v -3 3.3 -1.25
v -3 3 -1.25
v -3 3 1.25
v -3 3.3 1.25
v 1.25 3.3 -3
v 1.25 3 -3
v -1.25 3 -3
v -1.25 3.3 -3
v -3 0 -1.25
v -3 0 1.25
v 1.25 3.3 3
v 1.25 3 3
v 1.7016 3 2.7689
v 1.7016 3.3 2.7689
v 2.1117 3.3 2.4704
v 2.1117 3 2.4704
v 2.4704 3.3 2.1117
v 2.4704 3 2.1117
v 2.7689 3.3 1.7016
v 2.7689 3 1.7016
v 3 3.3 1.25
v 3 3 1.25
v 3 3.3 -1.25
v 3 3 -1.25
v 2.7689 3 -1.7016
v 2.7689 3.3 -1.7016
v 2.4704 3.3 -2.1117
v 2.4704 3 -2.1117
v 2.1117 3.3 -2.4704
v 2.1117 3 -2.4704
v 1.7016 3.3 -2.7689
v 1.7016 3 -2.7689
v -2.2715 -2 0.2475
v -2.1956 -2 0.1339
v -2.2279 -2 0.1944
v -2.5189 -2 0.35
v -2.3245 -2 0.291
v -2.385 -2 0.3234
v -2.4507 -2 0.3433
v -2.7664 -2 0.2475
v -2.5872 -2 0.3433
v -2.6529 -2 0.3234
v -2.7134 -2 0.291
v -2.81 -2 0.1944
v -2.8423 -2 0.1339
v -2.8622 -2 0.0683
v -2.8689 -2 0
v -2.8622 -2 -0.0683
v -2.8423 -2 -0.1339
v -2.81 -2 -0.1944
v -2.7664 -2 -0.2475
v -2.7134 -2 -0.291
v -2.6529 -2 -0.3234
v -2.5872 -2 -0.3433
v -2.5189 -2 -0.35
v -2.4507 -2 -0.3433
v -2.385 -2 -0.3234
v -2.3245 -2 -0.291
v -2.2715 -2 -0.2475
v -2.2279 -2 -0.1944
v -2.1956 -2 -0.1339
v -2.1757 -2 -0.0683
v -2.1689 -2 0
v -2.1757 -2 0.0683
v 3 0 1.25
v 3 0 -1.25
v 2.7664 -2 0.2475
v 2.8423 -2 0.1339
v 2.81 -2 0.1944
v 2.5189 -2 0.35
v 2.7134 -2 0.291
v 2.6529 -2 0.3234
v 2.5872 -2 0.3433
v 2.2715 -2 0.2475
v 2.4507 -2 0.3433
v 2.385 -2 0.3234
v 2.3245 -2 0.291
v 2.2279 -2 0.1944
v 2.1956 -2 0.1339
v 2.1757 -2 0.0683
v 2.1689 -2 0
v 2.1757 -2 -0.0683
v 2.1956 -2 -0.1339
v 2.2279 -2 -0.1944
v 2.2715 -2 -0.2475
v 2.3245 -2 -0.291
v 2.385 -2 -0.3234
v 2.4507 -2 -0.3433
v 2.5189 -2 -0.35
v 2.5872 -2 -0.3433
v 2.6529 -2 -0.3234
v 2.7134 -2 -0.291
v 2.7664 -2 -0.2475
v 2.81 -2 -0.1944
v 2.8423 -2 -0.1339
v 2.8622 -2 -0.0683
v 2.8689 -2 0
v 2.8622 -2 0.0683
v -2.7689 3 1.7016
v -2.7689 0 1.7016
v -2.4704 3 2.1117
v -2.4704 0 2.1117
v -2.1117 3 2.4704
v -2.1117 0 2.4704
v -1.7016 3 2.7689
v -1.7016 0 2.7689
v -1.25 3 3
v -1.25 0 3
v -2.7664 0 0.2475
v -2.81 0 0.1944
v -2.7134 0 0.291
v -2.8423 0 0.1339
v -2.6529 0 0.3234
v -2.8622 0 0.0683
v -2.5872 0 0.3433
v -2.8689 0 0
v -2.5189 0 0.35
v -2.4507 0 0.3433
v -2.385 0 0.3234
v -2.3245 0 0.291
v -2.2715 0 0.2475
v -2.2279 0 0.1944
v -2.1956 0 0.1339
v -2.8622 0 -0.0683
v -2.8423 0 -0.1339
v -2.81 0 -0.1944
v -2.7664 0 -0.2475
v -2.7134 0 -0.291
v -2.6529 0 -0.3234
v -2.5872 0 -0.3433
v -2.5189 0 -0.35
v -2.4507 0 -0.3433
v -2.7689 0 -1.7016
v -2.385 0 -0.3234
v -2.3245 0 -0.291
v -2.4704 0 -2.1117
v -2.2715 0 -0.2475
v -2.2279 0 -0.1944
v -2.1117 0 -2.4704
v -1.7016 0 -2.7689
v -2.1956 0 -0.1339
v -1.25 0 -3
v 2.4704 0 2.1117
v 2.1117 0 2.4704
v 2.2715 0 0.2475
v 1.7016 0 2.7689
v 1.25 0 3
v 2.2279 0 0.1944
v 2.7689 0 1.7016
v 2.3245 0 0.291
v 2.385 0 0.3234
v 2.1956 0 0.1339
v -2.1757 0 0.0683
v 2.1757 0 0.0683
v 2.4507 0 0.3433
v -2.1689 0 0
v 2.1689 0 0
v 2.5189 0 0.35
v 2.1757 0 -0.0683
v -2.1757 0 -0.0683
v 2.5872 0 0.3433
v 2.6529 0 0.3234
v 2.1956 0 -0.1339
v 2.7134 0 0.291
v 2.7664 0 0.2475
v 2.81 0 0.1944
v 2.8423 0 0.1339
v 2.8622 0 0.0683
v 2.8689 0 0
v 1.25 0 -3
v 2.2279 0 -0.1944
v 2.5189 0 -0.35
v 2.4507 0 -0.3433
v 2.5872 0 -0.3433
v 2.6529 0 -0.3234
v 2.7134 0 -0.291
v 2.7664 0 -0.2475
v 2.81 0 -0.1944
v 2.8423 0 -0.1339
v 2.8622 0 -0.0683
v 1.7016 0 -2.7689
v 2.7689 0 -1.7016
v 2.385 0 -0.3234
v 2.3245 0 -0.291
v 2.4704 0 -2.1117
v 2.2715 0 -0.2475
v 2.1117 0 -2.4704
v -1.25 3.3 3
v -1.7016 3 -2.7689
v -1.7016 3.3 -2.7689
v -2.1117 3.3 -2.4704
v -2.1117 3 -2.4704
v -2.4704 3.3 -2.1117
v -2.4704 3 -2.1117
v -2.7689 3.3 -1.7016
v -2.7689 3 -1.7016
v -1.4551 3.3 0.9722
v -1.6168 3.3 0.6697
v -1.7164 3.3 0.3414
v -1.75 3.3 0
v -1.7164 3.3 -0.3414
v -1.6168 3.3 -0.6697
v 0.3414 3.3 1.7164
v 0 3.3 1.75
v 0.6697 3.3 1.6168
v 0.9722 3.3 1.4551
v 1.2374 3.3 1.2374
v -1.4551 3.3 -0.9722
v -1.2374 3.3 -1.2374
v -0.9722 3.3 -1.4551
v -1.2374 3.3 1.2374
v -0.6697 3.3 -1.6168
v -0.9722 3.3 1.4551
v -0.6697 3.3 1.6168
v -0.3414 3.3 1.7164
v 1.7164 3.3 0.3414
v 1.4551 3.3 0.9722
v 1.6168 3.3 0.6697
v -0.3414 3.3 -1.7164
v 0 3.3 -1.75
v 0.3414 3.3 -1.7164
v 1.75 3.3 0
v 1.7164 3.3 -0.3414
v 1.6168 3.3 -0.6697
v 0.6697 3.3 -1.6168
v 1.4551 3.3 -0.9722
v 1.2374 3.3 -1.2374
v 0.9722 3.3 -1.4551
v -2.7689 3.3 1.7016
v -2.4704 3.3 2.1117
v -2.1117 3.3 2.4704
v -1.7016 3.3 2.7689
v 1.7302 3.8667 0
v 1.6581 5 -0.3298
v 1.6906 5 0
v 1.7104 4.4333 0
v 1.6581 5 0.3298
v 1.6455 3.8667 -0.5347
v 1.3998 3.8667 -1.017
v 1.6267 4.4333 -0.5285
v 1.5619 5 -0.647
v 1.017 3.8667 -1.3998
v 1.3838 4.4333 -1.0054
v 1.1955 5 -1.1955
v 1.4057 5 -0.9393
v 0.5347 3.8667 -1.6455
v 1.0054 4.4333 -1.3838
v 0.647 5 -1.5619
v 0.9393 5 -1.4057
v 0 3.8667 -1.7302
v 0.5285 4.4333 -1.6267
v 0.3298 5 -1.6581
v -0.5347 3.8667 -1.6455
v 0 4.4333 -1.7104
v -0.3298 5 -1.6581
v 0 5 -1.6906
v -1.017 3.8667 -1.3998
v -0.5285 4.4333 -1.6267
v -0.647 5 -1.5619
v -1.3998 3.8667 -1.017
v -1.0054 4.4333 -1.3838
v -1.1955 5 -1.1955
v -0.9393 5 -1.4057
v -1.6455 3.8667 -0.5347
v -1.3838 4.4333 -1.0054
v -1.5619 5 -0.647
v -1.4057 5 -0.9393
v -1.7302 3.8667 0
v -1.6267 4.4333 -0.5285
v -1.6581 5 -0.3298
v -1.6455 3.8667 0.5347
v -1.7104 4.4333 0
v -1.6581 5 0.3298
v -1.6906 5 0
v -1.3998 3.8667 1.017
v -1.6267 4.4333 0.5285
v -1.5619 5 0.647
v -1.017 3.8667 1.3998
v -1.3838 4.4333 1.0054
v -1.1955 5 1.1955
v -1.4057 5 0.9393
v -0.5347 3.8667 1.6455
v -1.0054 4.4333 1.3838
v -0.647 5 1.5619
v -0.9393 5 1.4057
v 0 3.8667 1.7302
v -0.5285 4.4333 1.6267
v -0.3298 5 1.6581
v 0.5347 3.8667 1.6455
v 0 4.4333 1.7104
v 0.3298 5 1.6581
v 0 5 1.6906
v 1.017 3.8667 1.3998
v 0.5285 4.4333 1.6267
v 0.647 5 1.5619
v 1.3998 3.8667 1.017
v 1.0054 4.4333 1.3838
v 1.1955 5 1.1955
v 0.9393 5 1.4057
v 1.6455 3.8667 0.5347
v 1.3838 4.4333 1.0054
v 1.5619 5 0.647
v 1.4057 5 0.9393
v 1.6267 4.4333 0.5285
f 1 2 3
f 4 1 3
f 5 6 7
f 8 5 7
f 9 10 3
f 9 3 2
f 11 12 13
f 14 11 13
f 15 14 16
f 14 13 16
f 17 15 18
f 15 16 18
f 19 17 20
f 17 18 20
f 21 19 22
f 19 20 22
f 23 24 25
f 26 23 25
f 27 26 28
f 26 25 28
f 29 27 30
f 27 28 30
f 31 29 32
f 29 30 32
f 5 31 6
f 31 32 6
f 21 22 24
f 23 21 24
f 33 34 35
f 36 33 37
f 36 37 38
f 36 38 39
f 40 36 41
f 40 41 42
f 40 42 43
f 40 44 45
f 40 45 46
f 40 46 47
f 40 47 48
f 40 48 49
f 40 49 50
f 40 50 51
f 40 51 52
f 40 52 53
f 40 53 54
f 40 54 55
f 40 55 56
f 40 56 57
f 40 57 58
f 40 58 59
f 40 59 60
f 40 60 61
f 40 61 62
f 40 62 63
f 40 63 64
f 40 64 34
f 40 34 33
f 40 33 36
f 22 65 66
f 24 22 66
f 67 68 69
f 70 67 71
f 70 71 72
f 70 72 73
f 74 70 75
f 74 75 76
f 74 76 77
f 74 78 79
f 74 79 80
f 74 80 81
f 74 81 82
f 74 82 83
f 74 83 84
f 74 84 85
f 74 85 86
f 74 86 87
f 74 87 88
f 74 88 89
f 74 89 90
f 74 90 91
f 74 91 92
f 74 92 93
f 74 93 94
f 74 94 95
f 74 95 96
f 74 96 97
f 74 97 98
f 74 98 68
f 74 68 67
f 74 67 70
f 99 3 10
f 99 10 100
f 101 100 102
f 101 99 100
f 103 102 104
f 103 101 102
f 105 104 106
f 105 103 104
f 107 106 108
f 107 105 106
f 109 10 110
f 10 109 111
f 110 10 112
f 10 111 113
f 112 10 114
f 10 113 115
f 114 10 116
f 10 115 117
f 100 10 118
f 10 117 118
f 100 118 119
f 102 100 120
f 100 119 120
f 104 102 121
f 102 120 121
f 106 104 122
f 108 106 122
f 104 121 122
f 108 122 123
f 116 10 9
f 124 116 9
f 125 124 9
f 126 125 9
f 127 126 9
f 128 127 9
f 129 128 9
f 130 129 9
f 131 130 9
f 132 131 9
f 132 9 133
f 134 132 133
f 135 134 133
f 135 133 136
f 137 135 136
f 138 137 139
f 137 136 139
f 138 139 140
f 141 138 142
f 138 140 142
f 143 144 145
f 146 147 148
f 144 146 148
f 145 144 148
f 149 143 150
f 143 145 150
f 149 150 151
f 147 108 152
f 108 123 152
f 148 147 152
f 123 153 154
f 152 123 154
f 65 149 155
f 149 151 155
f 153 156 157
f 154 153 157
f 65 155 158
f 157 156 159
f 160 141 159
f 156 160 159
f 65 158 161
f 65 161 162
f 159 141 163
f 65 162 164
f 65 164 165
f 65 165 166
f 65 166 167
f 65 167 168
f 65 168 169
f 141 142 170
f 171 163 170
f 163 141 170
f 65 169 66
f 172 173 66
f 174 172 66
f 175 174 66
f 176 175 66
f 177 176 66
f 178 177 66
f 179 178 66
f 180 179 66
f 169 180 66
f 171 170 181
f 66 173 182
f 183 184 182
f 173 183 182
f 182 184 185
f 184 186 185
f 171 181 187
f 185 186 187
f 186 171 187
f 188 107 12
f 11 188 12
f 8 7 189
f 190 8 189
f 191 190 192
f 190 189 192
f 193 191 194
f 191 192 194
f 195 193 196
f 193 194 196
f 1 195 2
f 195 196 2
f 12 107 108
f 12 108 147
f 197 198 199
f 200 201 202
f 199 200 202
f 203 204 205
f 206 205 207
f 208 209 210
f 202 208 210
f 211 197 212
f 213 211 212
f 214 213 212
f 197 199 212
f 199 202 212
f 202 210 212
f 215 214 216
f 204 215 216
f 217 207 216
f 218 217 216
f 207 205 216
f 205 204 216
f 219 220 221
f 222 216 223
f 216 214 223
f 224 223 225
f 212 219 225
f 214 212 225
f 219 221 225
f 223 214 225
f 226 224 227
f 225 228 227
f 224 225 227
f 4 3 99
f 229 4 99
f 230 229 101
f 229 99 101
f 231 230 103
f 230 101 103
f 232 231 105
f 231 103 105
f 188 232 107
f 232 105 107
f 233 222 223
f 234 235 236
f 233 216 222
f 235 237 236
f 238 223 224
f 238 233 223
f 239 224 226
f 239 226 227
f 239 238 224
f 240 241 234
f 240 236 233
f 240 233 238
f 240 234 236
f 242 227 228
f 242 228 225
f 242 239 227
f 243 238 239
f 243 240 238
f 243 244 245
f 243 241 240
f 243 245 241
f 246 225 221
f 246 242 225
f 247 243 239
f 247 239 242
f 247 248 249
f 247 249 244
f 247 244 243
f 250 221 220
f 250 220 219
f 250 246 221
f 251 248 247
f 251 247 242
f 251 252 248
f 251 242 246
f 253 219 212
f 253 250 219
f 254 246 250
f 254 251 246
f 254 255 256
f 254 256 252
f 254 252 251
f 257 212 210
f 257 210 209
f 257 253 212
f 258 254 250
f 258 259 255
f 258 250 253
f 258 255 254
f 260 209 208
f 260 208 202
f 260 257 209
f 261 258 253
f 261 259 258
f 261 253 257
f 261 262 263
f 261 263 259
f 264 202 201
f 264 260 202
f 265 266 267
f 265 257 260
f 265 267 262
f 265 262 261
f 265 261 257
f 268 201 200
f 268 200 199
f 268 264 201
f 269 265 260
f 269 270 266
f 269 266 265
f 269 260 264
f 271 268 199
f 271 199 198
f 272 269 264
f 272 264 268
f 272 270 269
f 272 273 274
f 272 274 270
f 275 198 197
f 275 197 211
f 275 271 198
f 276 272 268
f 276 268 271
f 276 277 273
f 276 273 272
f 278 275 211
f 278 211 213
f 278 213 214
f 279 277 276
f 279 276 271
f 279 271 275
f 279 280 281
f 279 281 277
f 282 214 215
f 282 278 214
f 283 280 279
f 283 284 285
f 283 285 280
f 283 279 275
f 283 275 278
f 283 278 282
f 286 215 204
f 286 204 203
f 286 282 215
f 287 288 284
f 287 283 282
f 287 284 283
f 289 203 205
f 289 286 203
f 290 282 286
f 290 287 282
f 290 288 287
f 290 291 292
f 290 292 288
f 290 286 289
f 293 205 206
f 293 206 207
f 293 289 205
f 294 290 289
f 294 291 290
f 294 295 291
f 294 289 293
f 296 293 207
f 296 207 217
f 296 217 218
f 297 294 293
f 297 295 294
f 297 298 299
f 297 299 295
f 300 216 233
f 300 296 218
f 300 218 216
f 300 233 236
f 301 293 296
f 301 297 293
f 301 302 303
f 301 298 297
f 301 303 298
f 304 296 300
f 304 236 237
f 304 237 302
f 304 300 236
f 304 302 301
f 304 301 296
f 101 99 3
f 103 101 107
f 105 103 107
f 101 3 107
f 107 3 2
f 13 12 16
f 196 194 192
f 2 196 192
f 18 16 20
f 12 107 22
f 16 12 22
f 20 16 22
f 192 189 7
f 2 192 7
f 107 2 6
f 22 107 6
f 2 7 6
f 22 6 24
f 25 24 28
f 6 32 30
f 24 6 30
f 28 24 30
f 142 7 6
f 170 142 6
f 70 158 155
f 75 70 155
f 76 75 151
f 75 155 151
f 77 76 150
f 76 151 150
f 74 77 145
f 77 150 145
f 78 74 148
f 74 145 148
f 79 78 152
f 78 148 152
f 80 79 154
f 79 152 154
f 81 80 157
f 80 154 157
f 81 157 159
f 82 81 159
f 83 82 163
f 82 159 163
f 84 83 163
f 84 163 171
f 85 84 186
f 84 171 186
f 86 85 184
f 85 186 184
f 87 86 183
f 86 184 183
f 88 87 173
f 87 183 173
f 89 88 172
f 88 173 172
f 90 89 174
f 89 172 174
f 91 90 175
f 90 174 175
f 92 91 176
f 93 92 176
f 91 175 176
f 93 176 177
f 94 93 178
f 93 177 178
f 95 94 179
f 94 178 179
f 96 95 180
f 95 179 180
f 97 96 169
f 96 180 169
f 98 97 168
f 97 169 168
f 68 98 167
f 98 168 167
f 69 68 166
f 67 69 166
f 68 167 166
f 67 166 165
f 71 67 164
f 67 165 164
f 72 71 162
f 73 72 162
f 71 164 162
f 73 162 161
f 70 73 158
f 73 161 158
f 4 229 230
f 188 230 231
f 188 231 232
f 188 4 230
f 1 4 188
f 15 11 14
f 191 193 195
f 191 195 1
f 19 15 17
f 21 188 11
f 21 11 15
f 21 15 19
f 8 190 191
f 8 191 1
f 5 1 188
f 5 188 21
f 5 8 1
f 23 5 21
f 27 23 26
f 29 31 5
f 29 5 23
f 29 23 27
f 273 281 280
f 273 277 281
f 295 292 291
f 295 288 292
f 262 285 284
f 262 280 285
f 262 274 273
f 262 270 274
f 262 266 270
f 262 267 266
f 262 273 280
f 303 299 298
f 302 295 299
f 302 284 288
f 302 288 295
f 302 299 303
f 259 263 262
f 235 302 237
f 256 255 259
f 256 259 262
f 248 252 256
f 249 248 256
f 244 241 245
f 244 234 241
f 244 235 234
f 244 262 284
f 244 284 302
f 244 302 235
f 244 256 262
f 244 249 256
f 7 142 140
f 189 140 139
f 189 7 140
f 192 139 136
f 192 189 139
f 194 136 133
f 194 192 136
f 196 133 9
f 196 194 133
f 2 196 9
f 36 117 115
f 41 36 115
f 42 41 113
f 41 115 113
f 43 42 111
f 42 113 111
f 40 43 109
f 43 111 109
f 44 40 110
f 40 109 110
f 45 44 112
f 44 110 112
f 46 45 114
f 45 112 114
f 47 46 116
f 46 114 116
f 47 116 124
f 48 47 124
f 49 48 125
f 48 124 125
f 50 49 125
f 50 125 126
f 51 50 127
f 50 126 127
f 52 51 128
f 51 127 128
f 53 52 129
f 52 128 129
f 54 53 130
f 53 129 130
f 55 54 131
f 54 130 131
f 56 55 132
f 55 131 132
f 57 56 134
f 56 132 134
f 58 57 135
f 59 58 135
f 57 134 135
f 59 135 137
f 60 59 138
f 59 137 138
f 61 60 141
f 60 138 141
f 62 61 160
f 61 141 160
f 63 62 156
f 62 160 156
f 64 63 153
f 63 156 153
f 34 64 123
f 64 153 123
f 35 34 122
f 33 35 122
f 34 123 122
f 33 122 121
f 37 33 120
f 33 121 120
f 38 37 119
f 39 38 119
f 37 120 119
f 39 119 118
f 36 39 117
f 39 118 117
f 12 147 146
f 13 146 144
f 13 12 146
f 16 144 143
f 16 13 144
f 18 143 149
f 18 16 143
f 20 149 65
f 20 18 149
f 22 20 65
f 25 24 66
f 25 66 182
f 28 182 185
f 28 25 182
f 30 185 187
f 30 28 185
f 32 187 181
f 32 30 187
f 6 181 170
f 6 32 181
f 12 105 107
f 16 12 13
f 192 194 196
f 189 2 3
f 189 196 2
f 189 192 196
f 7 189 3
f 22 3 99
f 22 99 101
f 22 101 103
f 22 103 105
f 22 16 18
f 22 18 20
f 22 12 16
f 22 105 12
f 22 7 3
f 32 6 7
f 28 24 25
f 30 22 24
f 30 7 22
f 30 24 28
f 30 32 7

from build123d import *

# Parameters (mm, degrees)
SCHIZZO1_W                   = 6
SCHIZZO1_H                   = 6
ESTRUSIONE_ESTRUSIONE1_DEPTH = 3
SCHIZZO2_OUTSIDE_W           = 9.8
SCHIZZO2_OUTSIDE_H           = 9.8
SCHIZZO2_OUTSIDE_R           = 3.25
TAGLIO_ESTRUSIONE1_DEPTH     = 6.196152423
SCHIZZO3_R                   = 0.35
ESTRUSIONE_ESTRUSIONE2_DEPTH = 2
ESTRUSIONE_ESTRUSIONE3_DEPTH = 0.3
SCHIZZO5_R                   = 1.75
ESTRUSIONE_ESTRUSIONE4_DEPTH = 1.7
ESTRUSIONE_ESTRUSIONE4_TAPER = 2


with BuildPart() as part:
    # Schizzo1 → Estrusione-Estrusione1 (new body)
    with BuildSketch(Plane(origin=(0, 0, 0), x_dir=(1, 0, 0), z_dir=(0, 1, 0))):
        Rectangle(SCHIZZO1_W, SCHIZZO1_H)
    extrude(amount=ESTRUSIONE_ESTRUSIONE1_DEPTH)

    # Schizzo2 outside → Taglio-Estrusione1 (cut, through all)
    with BuildSketch(Plane(origin=(0, 3, 0), x_dir=(1, 0, 0), z_dir=(0, 1, 0))):
        Rectangle(SCHIZZO2_OUTSIDE_W, SCHIZZO2_OUTSIDE_H)
        Circle(SCHIZZO2_OUTSIDE_R, mode=Mode.SUBTRACT)
    extrude(amount=-TAGLIO_ESTRUSIONE1_DEPTH, mode=Mode.SUBTRACT)

    # Schizzo3 → Estrusione-Estrusione2 (add)
    with BuildSketch(Plane.XZ):
        with Locations(Location((-2.518939755, 0, 0), (0, 0, 90))):
            Circle(SCHIZZO3_R)
        with Locations(Location((2.518939755, 0, 0), (0, 0, 90))):
            Circle(SCHIZZO3_R)
    extrude(amount=ESTRUSIONE_ESTRUSIONE2_DEPTH)


with BuildPart() as body_2:
    # Schizzo4 → Estrusione-Estrusione3 (new body)
    with BuildSketch(Plane(origin=(0, 3, 0), x_dir=(1, 0, 0), z_dir=(0, 1, 0))):
        with BuildLine():
            Line((-1.25, -3), (1.25, -3))
            ThreePointArc((1.25, -3), (2.298097039, -2.298097039), (3, -1.25))
            Line((3, -1.25), (3, 1.25))
            ThreePointArc((3, 1.25), (2.298097039, 2.298097039), (1.25, 3))
            Line((1.25, 3), (-1.25, 3))
            ThreePointArc((-1.25, 3), (-2.298097039, 2.298097039), (-3, 1.25))
            Line((-3, 1.25), (-3, -1.25))
            ThreePointArc((-3, -1.25), (-2.298097039, -2.298097039), (-1.25, -3))
        make_face()
    extrude(amount=ESTRUSIONE_ESTRUSIONE3_DEPTH)


with BuildPart() as body_3:
    # Schizzo5 → Estrusione-Estrusione4 (new body)
    with BuildSketch(Plane(origin=(0, 3.3, 0), x_dir=(1, 0, 0), z_dir=(0, 1, 0))):
        Circle(SCHIZZO5_R)
    extrude(amount=ESTRUSIONE_ESTRUSIONE4_DEPTH, taper=ESTRUSIONE_ESTRUSIONE4_TAPER)


solid = Compound([part.part, body_2.part, body_3.part])
